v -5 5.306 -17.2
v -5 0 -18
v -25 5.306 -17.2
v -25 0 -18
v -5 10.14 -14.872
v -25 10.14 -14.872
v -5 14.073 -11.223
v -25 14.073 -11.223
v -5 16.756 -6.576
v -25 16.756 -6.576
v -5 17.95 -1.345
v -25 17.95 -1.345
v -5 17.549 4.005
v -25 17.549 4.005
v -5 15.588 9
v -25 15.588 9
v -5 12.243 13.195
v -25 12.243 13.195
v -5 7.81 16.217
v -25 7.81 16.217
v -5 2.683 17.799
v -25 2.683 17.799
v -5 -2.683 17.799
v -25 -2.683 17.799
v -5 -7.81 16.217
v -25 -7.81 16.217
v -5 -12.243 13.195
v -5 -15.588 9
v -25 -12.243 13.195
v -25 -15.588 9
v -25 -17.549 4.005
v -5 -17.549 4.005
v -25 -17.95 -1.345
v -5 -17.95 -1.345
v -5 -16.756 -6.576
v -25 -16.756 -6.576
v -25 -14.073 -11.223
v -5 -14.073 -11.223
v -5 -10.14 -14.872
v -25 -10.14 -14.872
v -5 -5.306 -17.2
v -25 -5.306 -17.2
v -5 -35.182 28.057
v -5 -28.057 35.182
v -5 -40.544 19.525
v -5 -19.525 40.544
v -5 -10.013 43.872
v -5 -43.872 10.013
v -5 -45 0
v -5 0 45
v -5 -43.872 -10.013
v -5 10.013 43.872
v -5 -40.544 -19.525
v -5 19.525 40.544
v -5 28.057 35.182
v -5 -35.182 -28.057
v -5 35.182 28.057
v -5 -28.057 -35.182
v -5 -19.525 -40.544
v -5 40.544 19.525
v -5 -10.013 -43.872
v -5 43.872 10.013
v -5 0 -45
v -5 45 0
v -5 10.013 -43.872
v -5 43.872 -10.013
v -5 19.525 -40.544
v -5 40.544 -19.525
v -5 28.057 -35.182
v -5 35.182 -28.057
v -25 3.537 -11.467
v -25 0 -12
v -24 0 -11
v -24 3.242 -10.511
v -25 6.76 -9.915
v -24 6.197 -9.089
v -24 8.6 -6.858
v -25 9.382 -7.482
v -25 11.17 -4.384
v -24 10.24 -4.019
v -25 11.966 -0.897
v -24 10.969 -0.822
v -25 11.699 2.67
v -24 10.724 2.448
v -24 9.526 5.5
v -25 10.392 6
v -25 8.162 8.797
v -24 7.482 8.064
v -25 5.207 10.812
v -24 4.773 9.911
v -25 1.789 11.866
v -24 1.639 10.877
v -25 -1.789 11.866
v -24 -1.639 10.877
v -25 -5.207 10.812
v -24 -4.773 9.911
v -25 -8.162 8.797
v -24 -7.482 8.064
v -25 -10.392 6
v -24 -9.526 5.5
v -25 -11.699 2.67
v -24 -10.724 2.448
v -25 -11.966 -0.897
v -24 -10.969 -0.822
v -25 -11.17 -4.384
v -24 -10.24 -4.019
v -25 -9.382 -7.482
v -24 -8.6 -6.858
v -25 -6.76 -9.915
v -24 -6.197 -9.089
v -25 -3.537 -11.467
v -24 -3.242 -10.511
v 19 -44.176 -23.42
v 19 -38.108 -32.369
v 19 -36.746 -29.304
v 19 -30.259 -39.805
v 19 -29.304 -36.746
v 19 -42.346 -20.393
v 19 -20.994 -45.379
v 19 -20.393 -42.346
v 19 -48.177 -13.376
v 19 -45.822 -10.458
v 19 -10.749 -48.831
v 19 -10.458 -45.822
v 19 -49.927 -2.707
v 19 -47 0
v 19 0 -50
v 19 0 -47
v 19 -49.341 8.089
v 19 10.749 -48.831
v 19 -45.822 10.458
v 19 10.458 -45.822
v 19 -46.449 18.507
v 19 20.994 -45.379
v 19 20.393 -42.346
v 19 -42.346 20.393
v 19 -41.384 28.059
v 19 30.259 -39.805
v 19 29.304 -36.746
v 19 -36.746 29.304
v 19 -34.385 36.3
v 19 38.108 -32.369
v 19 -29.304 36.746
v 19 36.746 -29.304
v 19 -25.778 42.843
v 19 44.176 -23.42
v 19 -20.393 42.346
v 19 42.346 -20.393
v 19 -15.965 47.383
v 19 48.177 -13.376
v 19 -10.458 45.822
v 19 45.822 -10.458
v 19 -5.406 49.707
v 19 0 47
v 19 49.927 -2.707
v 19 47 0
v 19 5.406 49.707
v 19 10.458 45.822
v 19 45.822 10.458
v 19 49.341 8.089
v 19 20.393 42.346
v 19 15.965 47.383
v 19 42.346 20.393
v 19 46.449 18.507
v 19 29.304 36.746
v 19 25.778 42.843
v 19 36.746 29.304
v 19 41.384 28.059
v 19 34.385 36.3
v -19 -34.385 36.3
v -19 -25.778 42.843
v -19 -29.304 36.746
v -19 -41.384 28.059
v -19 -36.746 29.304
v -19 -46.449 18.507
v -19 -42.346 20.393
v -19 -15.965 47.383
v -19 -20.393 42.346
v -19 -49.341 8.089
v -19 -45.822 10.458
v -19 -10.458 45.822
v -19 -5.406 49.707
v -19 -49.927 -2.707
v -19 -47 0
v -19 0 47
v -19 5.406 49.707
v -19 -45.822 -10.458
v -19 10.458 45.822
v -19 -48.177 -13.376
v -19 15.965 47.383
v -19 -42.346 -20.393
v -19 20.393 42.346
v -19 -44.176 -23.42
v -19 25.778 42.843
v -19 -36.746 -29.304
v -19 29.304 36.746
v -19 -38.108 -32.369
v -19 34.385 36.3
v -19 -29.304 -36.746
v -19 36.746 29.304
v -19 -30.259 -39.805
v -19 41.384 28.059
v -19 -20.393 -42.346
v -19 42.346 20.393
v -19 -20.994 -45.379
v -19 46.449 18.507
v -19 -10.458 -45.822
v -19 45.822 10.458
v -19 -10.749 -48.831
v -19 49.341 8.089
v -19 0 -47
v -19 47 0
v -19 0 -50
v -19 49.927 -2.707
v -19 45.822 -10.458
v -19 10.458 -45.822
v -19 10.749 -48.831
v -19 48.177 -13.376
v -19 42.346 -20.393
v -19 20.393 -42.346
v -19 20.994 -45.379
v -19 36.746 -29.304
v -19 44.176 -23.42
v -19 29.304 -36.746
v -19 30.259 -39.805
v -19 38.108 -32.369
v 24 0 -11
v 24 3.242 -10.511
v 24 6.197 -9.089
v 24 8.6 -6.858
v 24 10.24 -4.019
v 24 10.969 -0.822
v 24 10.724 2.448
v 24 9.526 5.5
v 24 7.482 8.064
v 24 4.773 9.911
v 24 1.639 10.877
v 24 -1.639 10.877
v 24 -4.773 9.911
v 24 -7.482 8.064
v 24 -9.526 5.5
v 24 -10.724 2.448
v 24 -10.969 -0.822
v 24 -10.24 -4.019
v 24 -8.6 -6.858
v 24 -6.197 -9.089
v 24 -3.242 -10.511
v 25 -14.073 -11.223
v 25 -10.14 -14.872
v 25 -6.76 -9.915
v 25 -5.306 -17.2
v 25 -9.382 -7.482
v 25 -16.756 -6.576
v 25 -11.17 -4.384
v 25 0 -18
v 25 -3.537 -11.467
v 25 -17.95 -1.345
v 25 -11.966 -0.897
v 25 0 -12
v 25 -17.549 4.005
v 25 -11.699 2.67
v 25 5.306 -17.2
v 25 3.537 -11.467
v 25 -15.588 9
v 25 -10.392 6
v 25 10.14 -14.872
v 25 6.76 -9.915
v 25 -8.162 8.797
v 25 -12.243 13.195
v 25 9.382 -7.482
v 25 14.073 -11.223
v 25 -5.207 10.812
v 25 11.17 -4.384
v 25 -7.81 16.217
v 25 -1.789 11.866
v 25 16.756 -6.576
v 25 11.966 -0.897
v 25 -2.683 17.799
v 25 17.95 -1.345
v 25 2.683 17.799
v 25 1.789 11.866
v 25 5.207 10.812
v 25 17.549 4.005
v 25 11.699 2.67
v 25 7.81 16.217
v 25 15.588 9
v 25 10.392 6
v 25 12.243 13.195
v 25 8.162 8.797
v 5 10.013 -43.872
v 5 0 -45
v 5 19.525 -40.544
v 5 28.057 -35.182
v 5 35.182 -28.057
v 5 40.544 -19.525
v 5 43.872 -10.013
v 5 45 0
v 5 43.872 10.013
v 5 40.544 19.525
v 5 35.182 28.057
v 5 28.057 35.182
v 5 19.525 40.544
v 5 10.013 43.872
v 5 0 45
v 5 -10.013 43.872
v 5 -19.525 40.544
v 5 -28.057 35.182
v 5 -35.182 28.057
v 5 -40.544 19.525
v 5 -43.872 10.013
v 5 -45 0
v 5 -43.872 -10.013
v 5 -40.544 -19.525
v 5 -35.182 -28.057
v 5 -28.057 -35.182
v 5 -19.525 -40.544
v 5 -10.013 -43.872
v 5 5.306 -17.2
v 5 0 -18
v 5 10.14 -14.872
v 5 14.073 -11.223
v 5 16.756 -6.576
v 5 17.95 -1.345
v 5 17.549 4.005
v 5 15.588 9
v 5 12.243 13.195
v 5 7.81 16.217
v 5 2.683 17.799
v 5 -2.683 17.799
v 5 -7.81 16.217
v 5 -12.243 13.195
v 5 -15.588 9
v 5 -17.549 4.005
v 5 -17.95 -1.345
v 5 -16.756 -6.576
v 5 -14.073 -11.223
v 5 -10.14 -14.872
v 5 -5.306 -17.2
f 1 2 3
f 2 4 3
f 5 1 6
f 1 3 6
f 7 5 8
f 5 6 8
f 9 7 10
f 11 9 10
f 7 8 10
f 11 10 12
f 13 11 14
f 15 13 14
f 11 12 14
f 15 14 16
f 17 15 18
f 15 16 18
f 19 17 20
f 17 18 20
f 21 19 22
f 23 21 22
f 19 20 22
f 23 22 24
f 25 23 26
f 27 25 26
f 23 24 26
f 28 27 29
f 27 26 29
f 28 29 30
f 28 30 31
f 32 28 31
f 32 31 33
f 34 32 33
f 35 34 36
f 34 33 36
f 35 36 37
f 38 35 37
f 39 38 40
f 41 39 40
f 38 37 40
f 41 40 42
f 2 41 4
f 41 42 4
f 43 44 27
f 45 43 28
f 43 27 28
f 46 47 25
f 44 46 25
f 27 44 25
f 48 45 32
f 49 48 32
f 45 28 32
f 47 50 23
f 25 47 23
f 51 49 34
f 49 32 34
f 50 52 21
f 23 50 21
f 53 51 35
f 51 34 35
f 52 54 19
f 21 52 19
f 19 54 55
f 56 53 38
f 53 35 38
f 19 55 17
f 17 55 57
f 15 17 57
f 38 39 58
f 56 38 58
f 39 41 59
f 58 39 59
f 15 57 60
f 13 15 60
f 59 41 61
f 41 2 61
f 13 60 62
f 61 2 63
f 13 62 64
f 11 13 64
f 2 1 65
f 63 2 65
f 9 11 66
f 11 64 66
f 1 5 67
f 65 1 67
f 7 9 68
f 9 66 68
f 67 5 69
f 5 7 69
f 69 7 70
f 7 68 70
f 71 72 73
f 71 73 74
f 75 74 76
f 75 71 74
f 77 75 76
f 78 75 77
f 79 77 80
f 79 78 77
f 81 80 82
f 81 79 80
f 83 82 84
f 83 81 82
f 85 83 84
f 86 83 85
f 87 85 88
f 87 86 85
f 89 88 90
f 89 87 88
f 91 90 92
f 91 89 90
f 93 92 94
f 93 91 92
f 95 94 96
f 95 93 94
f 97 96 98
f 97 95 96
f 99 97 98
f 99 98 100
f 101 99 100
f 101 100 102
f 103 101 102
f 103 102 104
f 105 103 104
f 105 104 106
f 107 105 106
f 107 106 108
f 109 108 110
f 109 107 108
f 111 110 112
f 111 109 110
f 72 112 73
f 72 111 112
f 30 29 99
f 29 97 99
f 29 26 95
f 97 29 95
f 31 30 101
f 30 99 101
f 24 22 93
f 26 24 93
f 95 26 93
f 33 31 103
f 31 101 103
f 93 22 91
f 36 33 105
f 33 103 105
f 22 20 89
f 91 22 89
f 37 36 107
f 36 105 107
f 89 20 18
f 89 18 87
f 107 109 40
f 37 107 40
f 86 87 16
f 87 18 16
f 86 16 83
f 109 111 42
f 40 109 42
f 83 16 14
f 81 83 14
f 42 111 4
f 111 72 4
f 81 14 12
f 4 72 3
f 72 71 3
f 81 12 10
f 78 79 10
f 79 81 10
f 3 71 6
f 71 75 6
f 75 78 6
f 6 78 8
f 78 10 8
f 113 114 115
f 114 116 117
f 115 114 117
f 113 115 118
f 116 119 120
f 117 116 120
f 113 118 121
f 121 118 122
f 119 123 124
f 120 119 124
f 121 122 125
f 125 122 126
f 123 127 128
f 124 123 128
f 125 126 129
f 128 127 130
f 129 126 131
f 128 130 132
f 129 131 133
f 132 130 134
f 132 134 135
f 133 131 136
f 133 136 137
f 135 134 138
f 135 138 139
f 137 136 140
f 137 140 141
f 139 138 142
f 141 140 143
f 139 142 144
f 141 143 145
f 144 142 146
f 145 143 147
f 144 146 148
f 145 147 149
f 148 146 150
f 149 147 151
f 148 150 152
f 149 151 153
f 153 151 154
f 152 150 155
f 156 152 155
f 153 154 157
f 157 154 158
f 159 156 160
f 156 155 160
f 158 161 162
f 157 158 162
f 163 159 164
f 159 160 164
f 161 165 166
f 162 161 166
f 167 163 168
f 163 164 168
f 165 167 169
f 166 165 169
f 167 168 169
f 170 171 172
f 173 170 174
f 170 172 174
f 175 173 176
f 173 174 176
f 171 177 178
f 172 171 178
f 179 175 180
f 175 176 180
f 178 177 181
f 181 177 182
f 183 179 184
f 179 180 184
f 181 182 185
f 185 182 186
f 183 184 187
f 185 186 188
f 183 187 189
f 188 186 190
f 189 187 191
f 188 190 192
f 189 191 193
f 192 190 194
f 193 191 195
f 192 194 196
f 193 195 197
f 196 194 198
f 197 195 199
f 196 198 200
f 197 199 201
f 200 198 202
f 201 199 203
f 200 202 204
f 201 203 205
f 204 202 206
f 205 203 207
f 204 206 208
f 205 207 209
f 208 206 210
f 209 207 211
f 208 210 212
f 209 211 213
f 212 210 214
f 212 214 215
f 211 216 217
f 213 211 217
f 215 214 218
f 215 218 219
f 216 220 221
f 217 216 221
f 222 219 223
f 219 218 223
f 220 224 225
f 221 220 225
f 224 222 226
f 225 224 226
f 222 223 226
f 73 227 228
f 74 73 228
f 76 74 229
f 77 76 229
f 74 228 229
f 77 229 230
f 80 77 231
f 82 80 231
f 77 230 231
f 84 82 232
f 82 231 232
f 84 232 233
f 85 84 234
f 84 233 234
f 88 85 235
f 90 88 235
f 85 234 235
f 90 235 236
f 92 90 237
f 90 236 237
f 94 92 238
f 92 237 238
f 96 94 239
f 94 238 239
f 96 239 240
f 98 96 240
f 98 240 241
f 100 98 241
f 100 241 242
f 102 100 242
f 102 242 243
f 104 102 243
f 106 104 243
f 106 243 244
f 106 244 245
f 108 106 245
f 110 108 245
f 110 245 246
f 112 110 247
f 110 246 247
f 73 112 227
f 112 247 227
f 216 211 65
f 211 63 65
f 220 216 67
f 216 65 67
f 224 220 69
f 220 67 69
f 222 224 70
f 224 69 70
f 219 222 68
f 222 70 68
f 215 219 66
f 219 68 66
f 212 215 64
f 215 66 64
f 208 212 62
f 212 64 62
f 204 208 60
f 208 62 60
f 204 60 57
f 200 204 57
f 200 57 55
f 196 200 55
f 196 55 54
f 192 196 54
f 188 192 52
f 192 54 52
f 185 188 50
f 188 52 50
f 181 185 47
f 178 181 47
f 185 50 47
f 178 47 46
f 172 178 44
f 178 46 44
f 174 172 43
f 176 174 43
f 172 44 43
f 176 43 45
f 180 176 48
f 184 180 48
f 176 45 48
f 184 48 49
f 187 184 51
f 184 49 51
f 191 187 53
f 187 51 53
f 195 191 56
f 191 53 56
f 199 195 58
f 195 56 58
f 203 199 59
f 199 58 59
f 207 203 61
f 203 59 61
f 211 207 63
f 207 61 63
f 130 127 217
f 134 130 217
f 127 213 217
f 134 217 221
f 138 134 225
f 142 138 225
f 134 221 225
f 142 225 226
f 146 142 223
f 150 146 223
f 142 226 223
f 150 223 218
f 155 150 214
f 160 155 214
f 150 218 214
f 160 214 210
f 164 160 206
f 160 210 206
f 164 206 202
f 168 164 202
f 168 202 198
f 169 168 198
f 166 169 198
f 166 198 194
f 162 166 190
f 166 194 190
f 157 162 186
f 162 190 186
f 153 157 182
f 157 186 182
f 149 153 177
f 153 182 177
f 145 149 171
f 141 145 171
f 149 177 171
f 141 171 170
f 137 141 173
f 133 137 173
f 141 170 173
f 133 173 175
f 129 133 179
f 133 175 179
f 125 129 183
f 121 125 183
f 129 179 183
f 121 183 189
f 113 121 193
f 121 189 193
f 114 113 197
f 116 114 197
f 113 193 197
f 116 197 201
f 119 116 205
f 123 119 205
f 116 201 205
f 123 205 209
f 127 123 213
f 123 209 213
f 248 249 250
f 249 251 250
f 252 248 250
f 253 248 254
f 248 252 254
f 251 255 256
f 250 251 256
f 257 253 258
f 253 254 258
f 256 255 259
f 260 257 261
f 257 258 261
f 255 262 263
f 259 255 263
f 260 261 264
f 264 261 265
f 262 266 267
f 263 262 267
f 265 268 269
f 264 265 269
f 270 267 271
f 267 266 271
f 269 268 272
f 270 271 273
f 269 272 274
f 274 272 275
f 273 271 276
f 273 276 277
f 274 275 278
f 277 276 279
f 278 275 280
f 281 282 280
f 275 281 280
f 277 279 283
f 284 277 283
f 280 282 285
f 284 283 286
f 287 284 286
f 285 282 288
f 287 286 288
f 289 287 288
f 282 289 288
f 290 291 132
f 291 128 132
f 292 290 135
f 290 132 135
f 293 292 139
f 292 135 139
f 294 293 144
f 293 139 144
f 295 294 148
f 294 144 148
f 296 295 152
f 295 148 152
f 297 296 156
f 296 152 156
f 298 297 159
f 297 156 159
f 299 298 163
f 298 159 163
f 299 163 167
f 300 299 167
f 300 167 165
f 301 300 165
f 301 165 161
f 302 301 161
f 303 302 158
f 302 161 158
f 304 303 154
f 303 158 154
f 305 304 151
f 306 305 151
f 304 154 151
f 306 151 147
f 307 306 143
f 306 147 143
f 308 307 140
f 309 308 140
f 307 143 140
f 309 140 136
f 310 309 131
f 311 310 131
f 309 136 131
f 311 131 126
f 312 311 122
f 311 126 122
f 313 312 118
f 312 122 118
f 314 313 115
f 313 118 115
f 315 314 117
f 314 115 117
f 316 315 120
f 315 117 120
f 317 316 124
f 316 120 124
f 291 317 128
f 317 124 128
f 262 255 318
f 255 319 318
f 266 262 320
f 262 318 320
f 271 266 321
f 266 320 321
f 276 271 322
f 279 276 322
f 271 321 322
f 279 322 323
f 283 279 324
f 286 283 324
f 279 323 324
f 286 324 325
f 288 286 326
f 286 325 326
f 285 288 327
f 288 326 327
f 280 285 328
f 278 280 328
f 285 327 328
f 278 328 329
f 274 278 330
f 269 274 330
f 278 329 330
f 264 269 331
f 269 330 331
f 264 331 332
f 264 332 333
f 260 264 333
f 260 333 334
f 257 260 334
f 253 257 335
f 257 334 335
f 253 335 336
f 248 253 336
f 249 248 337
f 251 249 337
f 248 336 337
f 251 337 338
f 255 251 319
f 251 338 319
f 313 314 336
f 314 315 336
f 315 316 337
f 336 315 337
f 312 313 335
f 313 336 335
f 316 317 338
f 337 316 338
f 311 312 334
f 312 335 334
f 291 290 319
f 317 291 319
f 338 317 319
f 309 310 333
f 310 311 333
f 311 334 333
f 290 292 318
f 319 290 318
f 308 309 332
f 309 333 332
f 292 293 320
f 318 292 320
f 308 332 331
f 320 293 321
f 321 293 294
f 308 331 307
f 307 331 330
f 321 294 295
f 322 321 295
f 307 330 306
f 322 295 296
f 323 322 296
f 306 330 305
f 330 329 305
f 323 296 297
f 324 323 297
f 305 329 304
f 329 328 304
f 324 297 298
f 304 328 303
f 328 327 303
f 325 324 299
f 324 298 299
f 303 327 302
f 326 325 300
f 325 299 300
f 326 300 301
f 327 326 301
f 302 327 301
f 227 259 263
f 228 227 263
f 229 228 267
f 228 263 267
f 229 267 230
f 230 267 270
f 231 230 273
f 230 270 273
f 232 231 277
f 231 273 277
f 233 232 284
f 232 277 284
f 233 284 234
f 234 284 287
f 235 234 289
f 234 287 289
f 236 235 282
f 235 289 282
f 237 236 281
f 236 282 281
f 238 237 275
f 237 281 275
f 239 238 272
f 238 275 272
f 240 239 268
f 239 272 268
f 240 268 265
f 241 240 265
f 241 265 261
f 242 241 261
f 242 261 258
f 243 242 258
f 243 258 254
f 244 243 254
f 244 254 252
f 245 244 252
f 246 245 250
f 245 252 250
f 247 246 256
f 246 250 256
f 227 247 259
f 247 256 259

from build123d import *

# Parameters (mm, degrees)
CHANFREIN1_SIZE = 1


with BuildPart() as part:
    # Esquisse1 → Révolution1 (revolve)
    with BuildSketch(Plane.XY, mode=Mode.PRIVATE) as r_volution1_sk:
        Polygon((-25, 11), (25, 11), (25, 18), (5, 18), (5, 45), (19, 47), (19, 50), (-19, 50), (-19, 47), (-5, 45), (-5, 18), (-25, 18), align=None)
    revolve(r_volution1_sk.sketch.rotate(Axis((-40.635842881, 0, 0), (1, 0, 0)), 270), axis=Axis((-40.635842881, 0, 0), (1, 0, 0)))

    # Chanfrein1
    chanfrein1_edges = [part.edges().sort_by_distance(p)[0] for p in [
        (-25, 0, 11),
        (25, 0, 11),
    ]]
    chamfer(chanfrein1_edges, length=CHANFREIN1_SIZE)


solid = part.part
